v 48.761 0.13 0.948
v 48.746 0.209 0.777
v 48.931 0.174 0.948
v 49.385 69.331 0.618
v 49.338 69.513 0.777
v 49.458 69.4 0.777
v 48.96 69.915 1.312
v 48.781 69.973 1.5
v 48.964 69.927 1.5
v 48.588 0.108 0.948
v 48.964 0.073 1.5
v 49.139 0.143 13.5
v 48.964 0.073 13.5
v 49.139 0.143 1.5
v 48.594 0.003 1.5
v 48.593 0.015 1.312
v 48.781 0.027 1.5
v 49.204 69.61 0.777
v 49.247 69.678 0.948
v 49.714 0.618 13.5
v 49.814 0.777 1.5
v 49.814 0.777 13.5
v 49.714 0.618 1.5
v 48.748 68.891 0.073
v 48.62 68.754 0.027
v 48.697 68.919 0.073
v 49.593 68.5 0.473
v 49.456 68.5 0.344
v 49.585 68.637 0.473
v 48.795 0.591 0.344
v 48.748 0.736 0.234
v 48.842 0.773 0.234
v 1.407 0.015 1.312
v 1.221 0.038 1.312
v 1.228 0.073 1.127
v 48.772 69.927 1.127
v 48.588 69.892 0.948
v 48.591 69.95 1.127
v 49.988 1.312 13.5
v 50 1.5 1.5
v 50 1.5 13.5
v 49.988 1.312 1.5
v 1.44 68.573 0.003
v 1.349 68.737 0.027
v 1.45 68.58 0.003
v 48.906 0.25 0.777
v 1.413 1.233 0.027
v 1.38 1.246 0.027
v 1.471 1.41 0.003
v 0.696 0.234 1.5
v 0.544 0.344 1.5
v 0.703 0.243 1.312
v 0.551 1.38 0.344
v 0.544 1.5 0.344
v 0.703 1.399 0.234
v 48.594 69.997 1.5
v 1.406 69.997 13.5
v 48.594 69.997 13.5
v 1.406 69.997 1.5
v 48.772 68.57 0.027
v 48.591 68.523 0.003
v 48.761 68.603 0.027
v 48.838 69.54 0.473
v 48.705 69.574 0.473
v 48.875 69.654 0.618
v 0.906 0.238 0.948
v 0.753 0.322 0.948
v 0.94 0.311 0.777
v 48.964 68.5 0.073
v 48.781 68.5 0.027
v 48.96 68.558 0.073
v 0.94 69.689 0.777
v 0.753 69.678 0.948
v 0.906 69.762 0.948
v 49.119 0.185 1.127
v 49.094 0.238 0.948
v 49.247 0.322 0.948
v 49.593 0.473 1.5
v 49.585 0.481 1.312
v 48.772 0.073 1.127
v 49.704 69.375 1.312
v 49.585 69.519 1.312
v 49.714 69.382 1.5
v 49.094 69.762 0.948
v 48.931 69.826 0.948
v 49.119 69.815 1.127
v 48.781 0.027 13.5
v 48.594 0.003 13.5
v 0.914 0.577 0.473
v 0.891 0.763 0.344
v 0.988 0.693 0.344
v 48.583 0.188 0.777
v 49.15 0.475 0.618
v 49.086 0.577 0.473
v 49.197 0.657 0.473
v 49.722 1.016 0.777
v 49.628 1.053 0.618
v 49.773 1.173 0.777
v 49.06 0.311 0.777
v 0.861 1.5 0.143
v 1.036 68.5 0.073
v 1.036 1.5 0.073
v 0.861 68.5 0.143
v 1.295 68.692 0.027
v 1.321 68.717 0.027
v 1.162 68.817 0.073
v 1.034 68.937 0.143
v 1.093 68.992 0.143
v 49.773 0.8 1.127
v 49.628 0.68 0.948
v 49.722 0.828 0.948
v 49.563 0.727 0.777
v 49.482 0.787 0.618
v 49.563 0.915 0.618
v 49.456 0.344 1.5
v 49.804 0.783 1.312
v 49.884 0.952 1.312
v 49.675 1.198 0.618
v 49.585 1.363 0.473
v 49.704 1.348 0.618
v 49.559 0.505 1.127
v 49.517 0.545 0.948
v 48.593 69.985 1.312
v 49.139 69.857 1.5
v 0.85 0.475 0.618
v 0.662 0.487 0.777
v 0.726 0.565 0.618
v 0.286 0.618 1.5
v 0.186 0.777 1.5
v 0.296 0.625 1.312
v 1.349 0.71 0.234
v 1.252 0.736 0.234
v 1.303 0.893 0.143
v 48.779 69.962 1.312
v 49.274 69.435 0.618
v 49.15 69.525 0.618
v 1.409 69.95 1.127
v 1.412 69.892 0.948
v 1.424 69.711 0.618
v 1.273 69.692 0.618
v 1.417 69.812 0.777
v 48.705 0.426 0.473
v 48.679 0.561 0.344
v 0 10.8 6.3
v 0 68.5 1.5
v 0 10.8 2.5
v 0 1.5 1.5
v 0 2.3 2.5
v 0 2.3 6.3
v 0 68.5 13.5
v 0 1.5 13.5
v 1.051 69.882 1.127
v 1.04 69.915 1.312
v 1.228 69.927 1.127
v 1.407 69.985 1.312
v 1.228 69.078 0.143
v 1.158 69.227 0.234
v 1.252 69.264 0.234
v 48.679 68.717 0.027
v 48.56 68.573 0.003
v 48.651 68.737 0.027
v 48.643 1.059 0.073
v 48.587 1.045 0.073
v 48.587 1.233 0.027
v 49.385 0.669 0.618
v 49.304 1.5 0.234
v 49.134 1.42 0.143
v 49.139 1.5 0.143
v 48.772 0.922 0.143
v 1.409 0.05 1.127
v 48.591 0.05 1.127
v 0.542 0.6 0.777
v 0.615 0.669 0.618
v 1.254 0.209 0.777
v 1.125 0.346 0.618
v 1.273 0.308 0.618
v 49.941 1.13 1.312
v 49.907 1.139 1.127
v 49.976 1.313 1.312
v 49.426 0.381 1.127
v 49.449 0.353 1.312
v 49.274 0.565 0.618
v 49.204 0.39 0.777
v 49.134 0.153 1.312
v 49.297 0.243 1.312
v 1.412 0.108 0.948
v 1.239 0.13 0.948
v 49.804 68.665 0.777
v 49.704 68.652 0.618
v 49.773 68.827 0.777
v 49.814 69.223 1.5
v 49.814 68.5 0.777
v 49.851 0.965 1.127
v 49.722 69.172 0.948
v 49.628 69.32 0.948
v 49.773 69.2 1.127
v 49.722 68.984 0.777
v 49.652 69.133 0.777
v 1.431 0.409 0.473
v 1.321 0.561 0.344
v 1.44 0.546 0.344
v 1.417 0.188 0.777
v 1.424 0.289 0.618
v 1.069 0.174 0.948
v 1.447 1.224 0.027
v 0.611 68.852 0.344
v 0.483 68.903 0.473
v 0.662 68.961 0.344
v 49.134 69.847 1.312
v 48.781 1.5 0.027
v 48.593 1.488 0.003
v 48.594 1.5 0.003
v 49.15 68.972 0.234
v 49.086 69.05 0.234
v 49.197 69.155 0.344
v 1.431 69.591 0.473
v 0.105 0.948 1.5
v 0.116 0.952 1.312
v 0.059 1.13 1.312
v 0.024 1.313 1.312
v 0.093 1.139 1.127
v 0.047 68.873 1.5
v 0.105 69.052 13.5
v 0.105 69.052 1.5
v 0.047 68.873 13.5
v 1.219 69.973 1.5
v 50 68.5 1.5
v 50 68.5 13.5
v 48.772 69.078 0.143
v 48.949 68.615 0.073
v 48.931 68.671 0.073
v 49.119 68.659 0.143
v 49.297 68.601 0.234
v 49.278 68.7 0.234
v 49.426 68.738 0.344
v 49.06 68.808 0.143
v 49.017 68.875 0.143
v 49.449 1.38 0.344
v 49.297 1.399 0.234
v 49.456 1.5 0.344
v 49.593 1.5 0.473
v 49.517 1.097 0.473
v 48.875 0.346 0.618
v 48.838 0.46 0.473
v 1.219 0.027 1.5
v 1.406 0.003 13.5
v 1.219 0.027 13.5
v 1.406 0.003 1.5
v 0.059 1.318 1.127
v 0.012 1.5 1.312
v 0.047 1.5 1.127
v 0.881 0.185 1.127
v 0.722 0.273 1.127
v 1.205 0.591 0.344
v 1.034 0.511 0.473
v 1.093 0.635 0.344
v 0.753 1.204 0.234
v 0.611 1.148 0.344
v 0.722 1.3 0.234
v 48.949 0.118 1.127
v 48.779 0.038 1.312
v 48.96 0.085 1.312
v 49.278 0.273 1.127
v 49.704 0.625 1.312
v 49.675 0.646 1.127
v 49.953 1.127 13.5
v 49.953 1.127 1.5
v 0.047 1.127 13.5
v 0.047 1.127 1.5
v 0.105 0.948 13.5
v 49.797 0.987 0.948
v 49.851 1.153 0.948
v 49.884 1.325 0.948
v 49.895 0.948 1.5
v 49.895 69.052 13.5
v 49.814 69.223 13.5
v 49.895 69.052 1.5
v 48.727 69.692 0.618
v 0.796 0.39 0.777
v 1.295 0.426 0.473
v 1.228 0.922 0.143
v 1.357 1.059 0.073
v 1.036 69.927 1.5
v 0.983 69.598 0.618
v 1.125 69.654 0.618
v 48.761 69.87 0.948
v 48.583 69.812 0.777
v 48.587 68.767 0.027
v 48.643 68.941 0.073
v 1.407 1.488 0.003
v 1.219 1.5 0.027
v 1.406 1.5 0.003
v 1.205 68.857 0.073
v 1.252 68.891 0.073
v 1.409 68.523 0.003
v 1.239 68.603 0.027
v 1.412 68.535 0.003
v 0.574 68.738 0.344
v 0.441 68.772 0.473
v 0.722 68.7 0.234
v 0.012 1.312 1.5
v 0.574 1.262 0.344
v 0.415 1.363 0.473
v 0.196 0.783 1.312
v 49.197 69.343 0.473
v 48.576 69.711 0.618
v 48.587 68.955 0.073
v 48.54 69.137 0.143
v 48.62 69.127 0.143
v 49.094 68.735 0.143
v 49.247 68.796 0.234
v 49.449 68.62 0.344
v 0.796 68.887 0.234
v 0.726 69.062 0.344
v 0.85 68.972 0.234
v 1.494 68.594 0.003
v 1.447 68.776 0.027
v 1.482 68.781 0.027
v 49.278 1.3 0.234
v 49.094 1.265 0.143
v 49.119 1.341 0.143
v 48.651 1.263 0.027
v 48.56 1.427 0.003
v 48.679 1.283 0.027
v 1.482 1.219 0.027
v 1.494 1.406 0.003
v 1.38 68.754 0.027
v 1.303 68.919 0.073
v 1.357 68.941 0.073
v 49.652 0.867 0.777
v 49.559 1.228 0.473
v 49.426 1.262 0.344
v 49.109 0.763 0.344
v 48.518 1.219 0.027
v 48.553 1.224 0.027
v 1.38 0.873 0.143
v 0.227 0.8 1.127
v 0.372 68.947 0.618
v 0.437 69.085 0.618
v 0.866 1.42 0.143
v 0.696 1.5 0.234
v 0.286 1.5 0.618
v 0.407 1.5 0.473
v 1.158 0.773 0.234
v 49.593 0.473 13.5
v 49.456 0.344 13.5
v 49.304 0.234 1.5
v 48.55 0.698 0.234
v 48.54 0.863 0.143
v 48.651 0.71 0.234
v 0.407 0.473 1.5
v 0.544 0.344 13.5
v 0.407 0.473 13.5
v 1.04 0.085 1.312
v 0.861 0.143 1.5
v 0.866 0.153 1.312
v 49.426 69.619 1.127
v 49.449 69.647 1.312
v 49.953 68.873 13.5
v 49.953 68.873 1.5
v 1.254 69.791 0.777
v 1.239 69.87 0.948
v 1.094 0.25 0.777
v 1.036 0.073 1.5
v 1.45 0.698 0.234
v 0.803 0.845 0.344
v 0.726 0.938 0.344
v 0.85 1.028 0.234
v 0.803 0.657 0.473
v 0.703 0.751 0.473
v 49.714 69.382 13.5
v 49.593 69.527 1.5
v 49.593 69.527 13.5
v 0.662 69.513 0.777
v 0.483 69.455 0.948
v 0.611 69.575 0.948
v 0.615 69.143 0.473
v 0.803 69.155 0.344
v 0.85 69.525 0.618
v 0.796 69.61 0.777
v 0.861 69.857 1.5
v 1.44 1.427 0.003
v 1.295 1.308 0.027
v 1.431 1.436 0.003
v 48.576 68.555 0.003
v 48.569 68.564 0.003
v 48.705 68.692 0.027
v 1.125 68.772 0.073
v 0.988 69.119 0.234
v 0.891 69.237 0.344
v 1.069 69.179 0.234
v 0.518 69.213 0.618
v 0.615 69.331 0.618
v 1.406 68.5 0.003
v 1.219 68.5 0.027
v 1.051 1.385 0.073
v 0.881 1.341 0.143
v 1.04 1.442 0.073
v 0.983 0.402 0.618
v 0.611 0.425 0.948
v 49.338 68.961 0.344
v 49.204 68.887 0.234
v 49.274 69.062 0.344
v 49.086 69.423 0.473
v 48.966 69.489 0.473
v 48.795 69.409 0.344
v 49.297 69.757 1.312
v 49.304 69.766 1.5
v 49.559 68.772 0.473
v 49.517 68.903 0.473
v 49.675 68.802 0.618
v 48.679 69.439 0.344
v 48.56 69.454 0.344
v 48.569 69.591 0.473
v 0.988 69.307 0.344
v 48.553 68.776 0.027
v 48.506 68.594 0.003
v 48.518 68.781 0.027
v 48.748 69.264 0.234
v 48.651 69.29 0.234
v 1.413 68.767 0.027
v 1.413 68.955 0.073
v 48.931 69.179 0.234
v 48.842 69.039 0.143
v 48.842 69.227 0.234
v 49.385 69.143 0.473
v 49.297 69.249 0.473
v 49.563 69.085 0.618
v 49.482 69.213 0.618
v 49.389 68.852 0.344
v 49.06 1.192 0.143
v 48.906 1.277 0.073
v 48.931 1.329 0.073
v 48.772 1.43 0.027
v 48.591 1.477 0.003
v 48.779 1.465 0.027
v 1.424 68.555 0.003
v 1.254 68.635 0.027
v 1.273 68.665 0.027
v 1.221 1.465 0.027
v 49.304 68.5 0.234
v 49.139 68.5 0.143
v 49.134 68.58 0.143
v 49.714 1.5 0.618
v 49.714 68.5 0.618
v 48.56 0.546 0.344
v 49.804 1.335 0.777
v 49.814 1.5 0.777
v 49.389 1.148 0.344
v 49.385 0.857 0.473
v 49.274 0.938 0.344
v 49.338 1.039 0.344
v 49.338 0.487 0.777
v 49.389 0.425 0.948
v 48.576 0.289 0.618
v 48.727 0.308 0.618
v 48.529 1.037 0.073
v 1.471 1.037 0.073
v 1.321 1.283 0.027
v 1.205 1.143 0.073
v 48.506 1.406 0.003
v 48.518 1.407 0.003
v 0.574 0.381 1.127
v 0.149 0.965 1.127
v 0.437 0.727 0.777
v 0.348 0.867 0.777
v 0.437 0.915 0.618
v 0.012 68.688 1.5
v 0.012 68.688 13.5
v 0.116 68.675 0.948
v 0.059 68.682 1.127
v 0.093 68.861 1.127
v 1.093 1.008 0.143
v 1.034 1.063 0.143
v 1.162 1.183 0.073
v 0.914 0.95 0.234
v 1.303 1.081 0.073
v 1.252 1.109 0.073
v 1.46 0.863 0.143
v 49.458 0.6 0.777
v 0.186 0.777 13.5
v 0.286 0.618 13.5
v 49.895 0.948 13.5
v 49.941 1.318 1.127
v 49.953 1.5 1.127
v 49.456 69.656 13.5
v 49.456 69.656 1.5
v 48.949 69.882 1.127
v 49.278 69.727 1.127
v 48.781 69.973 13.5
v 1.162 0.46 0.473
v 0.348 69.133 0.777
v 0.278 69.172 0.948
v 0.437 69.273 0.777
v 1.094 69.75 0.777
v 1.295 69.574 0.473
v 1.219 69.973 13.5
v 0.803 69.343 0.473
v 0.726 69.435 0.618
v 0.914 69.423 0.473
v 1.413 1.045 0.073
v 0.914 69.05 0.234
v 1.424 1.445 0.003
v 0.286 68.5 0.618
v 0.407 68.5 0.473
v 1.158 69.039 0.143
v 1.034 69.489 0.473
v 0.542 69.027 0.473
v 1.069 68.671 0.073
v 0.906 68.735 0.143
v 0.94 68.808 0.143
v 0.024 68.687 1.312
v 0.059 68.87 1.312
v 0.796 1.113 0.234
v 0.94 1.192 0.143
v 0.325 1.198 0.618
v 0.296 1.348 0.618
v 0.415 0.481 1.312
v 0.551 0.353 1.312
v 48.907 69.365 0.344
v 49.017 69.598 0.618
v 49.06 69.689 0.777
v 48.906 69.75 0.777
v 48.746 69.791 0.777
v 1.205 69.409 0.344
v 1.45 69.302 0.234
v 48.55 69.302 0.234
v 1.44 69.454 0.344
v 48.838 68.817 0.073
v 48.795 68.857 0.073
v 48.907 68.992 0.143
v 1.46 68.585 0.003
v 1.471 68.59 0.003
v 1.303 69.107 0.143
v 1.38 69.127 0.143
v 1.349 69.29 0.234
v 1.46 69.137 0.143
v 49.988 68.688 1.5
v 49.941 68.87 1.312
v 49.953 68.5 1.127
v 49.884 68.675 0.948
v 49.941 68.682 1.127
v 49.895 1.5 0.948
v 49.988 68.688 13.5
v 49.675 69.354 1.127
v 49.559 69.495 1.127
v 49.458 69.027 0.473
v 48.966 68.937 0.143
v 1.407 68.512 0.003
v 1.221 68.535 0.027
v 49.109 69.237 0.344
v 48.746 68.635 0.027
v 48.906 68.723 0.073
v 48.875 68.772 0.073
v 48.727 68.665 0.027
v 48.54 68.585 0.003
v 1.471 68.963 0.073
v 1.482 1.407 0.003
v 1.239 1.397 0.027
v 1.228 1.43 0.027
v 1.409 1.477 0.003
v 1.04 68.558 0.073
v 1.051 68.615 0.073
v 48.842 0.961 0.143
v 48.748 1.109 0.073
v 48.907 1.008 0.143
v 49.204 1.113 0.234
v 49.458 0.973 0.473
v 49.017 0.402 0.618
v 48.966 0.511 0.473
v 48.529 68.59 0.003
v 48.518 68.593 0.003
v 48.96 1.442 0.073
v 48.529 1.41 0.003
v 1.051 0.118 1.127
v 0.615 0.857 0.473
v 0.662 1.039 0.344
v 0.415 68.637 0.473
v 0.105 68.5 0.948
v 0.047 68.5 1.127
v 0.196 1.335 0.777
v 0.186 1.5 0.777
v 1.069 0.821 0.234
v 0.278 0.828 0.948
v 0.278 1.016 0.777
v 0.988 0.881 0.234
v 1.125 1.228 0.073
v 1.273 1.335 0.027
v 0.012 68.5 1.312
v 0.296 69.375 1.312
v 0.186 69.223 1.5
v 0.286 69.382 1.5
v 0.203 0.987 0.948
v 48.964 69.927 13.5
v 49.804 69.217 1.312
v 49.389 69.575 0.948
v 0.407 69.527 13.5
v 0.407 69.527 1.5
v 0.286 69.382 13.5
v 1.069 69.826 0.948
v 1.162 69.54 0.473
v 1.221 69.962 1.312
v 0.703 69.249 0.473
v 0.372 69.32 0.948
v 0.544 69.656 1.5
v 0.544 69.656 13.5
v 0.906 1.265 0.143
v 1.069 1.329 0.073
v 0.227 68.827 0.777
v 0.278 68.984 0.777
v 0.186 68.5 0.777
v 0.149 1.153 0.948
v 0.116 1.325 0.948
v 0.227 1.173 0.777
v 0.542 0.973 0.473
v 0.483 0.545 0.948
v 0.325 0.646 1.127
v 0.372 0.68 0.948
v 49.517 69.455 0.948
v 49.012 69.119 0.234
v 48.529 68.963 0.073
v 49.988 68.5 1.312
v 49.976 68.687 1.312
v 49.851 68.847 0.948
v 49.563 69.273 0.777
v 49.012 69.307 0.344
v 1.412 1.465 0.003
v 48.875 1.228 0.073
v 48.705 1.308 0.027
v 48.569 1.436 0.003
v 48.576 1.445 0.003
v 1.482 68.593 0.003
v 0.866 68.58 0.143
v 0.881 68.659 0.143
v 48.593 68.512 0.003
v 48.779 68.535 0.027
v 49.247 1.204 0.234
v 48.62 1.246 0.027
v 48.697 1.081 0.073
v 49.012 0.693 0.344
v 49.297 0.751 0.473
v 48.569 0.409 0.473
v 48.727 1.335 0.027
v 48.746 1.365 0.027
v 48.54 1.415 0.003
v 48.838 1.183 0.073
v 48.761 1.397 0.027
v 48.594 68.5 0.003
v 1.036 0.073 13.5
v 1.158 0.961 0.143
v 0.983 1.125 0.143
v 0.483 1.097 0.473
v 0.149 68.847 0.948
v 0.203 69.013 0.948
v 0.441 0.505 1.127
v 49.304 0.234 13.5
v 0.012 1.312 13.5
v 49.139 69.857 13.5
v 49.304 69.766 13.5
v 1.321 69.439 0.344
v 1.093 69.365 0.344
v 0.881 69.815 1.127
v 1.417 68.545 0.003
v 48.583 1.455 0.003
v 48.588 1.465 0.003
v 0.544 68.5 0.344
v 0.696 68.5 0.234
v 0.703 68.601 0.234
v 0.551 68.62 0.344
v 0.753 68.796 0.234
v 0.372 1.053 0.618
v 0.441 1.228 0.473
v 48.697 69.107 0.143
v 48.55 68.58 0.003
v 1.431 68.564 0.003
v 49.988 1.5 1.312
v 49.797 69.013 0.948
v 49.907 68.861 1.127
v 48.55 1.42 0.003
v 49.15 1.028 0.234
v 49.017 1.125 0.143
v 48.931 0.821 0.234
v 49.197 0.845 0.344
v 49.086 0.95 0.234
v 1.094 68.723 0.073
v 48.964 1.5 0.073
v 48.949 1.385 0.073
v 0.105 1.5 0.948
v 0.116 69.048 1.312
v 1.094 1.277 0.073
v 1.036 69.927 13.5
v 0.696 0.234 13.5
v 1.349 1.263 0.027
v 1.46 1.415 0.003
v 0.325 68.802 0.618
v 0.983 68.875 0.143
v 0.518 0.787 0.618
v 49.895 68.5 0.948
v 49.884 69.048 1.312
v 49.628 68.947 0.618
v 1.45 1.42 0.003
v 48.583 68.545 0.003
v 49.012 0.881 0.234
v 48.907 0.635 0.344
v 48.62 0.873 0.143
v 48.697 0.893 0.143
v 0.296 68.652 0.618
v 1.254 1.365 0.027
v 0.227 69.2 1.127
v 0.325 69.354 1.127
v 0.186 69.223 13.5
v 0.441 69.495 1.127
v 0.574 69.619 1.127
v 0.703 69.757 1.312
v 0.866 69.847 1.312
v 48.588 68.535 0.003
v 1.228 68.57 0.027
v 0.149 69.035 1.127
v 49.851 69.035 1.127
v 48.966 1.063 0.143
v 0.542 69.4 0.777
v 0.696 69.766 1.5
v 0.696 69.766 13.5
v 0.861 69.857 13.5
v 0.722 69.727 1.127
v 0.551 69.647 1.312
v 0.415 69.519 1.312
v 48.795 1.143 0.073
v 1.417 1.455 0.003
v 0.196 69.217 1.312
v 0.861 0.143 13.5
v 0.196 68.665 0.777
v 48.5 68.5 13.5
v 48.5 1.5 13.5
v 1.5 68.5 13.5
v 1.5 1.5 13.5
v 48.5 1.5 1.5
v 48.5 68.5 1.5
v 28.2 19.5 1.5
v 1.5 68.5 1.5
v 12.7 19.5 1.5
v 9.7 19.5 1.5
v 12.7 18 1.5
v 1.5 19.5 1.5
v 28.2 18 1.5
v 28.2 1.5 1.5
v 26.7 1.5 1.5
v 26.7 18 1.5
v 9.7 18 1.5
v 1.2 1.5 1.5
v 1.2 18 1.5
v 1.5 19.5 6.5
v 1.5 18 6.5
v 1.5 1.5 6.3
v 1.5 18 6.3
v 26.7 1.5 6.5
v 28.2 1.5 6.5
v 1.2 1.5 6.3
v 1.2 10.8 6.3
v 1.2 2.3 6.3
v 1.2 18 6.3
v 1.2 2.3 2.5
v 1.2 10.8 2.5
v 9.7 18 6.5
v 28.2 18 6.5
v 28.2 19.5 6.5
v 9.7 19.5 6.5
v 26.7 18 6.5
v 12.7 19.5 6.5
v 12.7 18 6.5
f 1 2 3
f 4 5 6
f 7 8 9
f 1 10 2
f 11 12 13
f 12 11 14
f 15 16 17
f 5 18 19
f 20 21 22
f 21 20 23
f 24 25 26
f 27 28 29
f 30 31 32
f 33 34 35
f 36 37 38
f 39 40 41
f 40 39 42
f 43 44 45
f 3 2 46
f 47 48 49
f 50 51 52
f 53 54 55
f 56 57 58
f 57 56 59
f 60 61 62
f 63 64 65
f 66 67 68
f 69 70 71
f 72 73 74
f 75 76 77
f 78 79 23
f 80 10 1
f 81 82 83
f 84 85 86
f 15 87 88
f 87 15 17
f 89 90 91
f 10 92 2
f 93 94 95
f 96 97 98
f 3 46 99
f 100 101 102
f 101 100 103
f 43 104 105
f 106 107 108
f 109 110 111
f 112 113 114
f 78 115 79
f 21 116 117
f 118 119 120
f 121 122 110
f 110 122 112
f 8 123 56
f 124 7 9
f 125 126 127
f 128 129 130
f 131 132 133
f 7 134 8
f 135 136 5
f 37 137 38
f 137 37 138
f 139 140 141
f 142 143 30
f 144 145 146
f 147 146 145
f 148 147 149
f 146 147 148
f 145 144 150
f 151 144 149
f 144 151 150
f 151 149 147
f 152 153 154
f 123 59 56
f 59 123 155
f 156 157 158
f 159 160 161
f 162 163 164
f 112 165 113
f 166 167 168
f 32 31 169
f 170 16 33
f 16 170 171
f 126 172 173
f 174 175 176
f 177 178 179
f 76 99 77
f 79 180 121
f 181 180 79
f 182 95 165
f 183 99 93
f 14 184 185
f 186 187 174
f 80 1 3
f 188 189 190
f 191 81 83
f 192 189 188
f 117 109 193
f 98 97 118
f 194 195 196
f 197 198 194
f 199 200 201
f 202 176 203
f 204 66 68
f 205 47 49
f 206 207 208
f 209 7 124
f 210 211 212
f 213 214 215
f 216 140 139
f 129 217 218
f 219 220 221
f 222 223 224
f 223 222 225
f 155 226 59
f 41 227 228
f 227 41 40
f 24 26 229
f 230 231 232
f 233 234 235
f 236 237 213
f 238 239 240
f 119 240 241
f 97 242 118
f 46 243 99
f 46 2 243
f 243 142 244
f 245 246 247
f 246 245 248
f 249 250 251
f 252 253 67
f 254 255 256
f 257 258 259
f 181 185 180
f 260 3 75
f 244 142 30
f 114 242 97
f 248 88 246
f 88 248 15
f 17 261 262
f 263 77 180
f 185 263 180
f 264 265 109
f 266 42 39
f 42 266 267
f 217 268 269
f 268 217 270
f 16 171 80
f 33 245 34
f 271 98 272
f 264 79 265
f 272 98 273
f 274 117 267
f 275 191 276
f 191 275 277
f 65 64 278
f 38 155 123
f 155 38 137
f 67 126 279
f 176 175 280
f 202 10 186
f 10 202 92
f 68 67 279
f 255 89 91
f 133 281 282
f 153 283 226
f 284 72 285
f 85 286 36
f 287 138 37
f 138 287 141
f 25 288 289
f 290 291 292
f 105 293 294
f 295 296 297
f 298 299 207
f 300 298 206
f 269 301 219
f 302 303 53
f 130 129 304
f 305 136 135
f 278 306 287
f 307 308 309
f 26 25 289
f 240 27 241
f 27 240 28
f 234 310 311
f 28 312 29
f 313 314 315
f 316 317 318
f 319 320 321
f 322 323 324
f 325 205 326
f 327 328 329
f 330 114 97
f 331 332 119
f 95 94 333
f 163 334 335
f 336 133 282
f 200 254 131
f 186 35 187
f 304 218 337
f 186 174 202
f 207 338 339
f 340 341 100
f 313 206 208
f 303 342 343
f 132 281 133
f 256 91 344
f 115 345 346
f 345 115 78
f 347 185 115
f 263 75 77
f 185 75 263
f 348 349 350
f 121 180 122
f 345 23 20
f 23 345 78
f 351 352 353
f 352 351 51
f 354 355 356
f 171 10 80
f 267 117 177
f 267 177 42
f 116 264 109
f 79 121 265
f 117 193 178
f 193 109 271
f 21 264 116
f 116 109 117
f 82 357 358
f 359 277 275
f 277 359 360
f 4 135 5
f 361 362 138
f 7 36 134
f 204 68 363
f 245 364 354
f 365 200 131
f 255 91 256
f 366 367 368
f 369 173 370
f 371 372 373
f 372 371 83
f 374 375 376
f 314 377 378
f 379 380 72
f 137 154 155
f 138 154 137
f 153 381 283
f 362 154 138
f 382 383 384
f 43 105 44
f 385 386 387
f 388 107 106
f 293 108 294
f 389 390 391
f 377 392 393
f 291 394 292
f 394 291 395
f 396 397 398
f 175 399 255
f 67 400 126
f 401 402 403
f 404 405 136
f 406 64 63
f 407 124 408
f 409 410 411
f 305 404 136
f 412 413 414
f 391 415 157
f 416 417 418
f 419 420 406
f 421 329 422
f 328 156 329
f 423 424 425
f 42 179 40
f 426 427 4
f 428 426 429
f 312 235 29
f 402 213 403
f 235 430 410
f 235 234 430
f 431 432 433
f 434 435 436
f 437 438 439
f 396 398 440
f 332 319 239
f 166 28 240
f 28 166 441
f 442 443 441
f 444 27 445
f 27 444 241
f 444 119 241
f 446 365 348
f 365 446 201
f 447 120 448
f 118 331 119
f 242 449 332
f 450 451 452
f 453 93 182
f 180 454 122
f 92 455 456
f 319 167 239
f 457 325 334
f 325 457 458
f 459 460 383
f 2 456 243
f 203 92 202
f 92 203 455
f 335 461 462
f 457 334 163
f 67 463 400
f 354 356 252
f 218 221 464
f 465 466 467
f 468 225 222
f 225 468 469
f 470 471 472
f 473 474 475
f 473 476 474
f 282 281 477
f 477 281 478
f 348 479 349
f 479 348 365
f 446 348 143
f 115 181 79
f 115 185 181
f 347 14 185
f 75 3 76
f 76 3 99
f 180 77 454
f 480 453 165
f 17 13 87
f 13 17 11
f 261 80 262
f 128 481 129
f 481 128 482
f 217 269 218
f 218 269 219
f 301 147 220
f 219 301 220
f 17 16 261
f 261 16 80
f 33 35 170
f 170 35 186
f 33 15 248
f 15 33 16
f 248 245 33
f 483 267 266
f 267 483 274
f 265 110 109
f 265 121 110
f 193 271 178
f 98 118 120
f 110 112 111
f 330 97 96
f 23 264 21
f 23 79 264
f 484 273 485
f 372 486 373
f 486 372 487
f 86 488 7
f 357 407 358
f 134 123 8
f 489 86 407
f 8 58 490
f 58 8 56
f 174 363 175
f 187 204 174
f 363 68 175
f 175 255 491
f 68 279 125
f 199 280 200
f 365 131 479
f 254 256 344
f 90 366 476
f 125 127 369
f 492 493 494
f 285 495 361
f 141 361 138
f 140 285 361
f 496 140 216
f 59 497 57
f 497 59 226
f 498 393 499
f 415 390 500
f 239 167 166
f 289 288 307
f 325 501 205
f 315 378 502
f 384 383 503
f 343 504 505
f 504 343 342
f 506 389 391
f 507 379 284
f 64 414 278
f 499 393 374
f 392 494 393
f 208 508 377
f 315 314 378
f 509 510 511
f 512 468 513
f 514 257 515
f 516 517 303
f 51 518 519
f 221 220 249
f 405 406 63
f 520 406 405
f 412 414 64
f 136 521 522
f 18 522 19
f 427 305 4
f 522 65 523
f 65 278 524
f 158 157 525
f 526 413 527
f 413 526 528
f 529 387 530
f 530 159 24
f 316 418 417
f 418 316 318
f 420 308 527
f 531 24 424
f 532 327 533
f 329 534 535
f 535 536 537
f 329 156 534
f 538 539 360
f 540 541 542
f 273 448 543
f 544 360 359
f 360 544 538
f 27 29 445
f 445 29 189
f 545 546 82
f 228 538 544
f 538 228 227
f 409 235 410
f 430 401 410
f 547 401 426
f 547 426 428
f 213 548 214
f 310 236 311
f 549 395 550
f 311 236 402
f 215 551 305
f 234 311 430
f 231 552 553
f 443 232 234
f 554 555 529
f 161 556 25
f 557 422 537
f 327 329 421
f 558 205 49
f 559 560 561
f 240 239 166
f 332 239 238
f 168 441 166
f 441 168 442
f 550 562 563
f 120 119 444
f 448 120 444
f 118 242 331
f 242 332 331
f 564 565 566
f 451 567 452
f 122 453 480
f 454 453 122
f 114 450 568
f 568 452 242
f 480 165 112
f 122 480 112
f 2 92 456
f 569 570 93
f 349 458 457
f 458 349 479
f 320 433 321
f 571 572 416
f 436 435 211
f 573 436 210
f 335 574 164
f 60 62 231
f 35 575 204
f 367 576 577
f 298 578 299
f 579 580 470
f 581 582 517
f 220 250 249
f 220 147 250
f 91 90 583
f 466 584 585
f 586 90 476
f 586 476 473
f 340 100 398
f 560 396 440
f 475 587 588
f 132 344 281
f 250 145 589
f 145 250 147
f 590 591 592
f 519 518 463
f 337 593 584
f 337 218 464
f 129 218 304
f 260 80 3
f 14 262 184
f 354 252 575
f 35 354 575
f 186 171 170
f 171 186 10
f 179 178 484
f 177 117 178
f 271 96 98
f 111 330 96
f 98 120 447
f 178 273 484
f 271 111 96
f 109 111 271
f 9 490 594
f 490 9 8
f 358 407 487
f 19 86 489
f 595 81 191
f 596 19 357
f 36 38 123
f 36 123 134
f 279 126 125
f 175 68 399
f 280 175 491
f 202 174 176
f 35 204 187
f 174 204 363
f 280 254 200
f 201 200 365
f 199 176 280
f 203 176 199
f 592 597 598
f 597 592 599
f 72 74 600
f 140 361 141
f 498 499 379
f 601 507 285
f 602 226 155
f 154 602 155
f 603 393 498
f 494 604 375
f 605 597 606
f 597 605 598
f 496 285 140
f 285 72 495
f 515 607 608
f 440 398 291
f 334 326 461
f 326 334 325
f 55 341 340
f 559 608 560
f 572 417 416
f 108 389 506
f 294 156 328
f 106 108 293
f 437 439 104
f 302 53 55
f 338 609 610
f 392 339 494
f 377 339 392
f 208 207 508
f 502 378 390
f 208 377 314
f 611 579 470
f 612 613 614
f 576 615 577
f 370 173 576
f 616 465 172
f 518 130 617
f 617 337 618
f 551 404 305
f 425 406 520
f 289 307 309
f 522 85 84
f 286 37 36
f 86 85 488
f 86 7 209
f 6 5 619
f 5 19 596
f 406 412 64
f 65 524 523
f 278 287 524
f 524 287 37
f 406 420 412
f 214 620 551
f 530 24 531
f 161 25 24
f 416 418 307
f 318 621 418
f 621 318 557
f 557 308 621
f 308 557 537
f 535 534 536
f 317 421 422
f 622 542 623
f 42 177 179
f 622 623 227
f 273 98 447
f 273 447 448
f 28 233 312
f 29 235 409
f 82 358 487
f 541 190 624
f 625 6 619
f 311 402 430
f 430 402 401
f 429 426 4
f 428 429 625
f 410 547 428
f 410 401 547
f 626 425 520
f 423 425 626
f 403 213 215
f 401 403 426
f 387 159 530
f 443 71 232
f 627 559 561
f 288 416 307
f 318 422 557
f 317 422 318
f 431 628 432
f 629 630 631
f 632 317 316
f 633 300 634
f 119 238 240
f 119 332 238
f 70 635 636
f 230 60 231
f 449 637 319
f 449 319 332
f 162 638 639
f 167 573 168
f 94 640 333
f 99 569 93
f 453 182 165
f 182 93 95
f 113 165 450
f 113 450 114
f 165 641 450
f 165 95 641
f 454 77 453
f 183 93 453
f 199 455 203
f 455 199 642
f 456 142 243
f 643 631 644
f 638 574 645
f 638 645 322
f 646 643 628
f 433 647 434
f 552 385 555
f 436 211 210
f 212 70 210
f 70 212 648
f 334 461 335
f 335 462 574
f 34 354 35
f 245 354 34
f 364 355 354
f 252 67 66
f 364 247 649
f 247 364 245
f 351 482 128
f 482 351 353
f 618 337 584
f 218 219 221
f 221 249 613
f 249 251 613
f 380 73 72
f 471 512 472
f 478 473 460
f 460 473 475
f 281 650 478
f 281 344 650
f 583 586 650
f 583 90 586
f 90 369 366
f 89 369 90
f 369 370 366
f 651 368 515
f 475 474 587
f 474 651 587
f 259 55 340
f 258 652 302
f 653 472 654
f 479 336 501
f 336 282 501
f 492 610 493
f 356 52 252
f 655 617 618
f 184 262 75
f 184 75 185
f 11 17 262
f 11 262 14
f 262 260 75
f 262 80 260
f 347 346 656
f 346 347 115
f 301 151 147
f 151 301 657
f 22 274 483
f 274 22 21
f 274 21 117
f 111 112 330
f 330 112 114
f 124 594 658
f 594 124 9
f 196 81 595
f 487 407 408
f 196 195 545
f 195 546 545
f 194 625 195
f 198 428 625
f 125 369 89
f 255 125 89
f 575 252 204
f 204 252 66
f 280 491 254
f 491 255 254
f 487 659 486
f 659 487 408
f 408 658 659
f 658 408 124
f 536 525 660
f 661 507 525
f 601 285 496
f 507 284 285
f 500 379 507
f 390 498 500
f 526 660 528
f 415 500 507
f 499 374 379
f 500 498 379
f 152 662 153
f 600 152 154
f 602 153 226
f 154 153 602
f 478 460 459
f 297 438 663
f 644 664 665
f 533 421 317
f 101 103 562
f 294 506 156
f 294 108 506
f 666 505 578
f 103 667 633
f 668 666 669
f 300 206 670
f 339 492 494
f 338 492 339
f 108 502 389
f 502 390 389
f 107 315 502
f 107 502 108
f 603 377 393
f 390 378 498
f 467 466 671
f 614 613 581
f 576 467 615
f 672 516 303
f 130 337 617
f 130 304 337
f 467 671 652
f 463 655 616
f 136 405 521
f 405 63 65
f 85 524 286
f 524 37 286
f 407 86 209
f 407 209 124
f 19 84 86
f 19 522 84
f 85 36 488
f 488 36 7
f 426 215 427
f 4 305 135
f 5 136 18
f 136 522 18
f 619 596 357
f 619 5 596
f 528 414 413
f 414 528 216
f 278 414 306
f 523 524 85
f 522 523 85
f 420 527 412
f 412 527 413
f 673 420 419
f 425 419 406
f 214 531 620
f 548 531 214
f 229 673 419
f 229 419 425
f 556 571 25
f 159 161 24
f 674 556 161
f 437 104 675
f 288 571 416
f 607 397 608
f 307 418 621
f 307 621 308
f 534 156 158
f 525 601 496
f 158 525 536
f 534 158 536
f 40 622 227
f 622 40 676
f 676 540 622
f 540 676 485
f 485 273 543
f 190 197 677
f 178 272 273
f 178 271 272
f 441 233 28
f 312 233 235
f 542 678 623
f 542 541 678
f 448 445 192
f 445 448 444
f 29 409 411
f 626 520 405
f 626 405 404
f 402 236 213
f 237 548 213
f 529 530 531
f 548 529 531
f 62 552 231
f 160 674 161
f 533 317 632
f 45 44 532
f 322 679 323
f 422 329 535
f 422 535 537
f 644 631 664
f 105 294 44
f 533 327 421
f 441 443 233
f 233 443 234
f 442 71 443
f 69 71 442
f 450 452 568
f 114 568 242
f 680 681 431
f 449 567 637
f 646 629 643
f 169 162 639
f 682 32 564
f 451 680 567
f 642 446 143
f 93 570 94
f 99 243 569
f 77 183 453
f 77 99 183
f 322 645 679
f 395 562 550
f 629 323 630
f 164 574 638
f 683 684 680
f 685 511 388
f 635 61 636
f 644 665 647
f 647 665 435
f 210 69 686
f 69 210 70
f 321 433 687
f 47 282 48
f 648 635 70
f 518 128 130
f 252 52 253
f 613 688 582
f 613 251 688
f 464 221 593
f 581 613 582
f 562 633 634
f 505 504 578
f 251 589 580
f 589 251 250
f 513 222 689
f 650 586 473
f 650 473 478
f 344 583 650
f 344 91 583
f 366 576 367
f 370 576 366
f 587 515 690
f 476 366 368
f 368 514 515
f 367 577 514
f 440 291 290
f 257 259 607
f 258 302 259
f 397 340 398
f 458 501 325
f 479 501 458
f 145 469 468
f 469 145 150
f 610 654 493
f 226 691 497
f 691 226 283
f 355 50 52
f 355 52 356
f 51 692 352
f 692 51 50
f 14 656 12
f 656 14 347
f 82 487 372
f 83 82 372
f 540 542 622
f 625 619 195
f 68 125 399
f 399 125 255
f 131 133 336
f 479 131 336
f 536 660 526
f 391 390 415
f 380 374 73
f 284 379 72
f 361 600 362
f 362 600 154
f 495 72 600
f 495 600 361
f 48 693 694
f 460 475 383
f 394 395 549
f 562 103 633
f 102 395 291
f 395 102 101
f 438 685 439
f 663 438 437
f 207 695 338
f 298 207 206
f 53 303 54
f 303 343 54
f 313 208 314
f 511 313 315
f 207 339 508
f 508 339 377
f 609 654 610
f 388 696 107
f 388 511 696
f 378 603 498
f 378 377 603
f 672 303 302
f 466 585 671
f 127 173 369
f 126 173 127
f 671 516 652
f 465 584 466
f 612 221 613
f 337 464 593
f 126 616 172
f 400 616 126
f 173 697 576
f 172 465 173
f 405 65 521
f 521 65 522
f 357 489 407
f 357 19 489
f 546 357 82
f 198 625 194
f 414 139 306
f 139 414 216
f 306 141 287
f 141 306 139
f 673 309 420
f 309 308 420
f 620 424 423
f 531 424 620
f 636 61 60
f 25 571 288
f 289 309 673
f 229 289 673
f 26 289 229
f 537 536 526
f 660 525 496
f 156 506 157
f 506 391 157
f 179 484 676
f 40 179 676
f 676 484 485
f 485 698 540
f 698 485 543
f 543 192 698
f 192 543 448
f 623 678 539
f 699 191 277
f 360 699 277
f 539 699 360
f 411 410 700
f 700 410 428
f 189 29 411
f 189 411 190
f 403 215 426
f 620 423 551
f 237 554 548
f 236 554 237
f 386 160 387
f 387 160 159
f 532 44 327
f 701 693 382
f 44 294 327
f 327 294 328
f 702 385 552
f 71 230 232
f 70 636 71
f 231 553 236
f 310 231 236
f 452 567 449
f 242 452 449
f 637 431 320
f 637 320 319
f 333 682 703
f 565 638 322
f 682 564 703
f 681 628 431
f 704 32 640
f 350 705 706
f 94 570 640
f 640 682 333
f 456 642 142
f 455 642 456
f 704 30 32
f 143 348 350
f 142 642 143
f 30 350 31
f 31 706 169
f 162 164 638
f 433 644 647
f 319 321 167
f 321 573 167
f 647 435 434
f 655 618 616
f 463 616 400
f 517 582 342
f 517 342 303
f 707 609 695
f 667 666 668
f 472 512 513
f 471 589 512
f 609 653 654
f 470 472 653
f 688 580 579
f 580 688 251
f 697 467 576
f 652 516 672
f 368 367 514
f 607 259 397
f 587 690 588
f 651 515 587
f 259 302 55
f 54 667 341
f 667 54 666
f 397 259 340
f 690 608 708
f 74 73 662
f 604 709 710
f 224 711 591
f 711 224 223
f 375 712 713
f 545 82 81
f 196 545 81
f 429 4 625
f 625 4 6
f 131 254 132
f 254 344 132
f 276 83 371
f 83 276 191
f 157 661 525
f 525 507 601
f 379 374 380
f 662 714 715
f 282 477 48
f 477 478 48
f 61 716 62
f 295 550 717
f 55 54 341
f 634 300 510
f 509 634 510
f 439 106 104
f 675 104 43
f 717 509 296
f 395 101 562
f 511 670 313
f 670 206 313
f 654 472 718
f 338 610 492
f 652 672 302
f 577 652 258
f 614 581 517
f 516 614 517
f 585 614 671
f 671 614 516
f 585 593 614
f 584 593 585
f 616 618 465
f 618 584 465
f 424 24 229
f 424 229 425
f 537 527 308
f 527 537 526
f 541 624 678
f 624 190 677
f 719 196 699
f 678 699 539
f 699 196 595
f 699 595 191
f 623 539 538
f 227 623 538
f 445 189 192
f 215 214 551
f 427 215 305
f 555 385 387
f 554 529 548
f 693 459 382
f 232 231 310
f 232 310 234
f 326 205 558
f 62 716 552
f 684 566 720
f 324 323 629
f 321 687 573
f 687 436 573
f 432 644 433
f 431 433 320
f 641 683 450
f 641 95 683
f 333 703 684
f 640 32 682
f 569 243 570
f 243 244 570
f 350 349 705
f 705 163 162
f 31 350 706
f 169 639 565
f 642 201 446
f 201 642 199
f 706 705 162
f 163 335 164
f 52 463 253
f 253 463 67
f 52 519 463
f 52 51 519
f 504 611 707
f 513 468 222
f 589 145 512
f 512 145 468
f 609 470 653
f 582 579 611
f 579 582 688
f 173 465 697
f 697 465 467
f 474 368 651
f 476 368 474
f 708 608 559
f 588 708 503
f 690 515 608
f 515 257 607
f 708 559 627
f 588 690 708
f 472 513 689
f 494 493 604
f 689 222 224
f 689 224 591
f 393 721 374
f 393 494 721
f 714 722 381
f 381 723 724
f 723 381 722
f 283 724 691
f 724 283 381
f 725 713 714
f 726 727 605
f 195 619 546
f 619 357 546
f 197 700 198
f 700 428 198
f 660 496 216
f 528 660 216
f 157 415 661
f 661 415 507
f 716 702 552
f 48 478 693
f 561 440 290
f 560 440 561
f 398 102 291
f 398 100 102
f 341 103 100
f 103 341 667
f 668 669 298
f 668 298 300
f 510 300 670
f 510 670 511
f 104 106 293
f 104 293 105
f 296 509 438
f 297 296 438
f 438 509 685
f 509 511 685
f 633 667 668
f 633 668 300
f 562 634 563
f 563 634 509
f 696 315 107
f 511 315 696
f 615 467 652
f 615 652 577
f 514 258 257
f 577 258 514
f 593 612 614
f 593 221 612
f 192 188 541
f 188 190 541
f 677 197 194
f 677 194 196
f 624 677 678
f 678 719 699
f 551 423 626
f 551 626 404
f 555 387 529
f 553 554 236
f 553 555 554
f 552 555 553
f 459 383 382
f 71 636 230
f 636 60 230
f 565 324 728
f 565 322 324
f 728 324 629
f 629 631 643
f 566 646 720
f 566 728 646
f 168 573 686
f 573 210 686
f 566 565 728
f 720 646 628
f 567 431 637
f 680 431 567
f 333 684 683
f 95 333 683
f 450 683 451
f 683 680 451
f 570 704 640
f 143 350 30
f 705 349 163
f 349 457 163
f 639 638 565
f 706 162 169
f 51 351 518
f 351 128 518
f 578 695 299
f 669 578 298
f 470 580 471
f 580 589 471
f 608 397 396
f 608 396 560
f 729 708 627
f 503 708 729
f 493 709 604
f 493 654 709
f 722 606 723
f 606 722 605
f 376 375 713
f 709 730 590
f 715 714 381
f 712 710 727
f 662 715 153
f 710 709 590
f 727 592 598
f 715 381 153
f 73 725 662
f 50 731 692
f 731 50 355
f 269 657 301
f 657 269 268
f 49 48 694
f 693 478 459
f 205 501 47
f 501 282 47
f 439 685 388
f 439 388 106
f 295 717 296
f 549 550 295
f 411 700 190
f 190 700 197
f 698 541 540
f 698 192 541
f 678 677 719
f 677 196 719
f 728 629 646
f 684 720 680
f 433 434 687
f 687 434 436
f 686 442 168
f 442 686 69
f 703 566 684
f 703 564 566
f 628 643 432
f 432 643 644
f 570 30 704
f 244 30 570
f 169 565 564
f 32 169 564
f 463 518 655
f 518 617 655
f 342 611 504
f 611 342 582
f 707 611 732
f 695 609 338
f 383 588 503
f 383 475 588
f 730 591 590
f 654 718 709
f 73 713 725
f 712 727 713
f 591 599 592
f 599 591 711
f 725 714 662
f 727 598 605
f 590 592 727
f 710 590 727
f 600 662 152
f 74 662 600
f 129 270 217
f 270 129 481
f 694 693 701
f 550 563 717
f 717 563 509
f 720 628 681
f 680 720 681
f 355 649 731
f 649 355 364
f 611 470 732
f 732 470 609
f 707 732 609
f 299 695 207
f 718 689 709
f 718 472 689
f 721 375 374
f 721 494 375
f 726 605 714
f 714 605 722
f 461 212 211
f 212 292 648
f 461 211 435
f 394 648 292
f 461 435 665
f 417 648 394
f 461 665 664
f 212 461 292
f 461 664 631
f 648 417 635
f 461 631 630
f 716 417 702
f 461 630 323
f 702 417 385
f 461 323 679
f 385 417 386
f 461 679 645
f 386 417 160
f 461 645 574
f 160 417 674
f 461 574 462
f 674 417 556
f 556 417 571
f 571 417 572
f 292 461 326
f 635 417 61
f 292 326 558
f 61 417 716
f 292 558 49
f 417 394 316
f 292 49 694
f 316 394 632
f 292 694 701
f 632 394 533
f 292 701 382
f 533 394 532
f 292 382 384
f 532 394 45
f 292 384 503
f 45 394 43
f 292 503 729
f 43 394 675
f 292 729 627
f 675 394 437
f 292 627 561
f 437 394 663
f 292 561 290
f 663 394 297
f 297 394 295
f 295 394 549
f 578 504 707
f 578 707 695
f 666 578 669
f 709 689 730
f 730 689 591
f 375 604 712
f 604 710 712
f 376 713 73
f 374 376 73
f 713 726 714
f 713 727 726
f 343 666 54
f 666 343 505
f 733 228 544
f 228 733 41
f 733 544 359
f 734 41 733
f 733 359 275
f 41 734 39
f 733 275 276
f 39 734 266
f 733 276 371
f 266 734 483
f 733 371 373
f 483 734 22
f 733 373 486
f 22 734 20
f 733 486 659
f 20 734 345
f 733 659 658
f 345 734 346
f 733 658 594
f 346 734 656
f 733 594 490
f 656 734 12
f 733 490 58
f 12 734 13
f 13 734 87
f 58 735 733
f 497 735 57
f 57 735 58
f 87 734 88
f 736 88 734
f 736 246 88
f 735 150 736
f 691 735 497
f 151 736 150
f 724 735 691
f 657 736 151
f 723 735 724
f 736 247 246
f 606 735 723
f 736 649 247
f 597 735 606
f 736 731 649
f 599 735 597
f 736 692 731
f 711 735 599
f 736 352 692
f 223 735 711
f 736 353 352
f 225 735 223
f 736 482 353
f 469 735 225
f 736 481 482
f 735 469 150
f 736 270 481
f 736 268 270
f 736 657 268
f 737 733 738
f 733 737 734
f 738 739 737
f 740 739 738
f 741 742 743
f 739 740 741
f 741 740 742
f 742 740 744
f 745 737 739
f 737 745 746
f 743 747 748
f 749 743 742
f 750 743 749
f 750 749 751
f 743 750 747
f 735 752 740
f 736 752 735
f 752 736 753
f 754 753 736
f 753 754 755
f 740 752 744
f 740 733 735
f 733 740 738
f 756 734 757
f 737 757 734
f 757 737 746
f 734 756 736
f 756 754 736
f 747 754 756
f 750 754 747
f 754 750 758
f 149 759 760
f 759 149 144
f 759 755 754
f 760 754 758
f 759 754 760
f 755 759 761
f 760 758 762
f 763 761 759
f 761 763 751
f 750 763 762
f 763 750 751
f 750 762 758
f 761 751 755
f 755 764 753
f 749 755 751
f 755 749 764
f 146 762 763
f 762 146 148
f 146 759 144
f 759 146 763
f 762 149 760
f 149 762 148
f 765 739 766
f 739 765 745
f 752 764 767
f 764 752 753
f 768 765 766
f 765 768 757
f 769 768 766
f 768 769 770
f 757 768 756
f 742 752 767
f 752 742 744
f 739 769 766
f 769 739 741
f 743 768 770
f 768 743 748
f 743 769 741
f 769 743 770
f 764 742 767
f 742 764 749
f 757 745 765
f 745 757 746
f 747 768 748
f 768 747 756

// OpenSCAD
// file: common.scad
$fn = 50;

// These are the sizes of the INSIDE of the case
casewidth = 47; // was 45
caselength = 67; // was 65
caseheight = 12;

// This is the normal thickness of the wall for the whole case and the USB supports
casethickness = 1.5; // was 2

// This is the thickness of the wall on the USB adapter
// It has to be slightly thinner there because the USB port doesn't mate otherwise
usbcasethickness = 1.2; // was 1.5

// This is the height of the thinner wall for the USB board
usbcaseheight = 6;

// This is an estimation of the USB board width.
// It's somewhat wider than the real size to account for printing variations and the voltage switch.
usbboardwidth = 16.5; // was 19

// This is the length of the USB board.
// This NEEDS to be precise, because if the board is loose, it'll be pushed inside the case when connecting the USB, and make connection impossible.
usbboardlength = 25.5;
//usbboardlength = 0;

// This is the height of the tabs that support the USB board
usbsupportheight = 5; // was 4

// These variables are the position and size of the USB hole
usbholey = 0.8; // was 2
usbholez = 1;
usbholewidth = 8.5; // was 9
usbholeheight = 3.8; // was 4

// The position and width of the USB voltage selection switch from the front wall.
// They don't need to be particularly accurate.
usbswitchpos = 10;
usbswitchwidth = 3;

// Top lid tab height
toplidtabheight = 4;

// Top lid engraving depth
toplidengraving = 1;

module casebase() {
    translate([casethickness, casethickness, casethickness]) {
        minkowski() {
            cube([casewidth, caselength, caseheight]);
            sphere(r=casethickness);
        }
    };
}
// main file
include <common.scad>;

difference() {
    intersection() {
        casebase();

        // Remove top lid
        cube([casewidth + 2 * casethickness, caselength + 2 * casethickness, casethickness + caseheight]);
    }

    // Make it hollow
    translate([casethickness, casethickness, casethickness]) {
        cube([casewidth, caselength, caseheight]);
    }

    // Thinnen USB wall
    translate([usbcasethickness, casethickness, casethickness]) {
        cube([casethickness - usbcasethickness, usbboardwidth, usbholez + usbholeheight]);
    }

    // Make hole for USB
    translate([0, casethickness + usbholey, casethickness + usbholez])
        cube([casethickness, usbholewidth, usbholeheight]);
}

// Back wall
translate([usbcasethickness + usbboardlength, casethickness, casethickness])
    cube([casethickness, usbboardwidth, usbsupportheight]);

// Side wall, with hole for 
translate([usbcasethickness, casethickness + usbboardwidth, casethickness])
    difference() {
        cube([usbboardlength + casethickness, casethickness, usbsupportheight]);
        translate([usbswitchpos - usbswitchwidth / 2, 0, 0])
            cube([usbswitchwidth, casethickness, usbsupportheight]);
}
